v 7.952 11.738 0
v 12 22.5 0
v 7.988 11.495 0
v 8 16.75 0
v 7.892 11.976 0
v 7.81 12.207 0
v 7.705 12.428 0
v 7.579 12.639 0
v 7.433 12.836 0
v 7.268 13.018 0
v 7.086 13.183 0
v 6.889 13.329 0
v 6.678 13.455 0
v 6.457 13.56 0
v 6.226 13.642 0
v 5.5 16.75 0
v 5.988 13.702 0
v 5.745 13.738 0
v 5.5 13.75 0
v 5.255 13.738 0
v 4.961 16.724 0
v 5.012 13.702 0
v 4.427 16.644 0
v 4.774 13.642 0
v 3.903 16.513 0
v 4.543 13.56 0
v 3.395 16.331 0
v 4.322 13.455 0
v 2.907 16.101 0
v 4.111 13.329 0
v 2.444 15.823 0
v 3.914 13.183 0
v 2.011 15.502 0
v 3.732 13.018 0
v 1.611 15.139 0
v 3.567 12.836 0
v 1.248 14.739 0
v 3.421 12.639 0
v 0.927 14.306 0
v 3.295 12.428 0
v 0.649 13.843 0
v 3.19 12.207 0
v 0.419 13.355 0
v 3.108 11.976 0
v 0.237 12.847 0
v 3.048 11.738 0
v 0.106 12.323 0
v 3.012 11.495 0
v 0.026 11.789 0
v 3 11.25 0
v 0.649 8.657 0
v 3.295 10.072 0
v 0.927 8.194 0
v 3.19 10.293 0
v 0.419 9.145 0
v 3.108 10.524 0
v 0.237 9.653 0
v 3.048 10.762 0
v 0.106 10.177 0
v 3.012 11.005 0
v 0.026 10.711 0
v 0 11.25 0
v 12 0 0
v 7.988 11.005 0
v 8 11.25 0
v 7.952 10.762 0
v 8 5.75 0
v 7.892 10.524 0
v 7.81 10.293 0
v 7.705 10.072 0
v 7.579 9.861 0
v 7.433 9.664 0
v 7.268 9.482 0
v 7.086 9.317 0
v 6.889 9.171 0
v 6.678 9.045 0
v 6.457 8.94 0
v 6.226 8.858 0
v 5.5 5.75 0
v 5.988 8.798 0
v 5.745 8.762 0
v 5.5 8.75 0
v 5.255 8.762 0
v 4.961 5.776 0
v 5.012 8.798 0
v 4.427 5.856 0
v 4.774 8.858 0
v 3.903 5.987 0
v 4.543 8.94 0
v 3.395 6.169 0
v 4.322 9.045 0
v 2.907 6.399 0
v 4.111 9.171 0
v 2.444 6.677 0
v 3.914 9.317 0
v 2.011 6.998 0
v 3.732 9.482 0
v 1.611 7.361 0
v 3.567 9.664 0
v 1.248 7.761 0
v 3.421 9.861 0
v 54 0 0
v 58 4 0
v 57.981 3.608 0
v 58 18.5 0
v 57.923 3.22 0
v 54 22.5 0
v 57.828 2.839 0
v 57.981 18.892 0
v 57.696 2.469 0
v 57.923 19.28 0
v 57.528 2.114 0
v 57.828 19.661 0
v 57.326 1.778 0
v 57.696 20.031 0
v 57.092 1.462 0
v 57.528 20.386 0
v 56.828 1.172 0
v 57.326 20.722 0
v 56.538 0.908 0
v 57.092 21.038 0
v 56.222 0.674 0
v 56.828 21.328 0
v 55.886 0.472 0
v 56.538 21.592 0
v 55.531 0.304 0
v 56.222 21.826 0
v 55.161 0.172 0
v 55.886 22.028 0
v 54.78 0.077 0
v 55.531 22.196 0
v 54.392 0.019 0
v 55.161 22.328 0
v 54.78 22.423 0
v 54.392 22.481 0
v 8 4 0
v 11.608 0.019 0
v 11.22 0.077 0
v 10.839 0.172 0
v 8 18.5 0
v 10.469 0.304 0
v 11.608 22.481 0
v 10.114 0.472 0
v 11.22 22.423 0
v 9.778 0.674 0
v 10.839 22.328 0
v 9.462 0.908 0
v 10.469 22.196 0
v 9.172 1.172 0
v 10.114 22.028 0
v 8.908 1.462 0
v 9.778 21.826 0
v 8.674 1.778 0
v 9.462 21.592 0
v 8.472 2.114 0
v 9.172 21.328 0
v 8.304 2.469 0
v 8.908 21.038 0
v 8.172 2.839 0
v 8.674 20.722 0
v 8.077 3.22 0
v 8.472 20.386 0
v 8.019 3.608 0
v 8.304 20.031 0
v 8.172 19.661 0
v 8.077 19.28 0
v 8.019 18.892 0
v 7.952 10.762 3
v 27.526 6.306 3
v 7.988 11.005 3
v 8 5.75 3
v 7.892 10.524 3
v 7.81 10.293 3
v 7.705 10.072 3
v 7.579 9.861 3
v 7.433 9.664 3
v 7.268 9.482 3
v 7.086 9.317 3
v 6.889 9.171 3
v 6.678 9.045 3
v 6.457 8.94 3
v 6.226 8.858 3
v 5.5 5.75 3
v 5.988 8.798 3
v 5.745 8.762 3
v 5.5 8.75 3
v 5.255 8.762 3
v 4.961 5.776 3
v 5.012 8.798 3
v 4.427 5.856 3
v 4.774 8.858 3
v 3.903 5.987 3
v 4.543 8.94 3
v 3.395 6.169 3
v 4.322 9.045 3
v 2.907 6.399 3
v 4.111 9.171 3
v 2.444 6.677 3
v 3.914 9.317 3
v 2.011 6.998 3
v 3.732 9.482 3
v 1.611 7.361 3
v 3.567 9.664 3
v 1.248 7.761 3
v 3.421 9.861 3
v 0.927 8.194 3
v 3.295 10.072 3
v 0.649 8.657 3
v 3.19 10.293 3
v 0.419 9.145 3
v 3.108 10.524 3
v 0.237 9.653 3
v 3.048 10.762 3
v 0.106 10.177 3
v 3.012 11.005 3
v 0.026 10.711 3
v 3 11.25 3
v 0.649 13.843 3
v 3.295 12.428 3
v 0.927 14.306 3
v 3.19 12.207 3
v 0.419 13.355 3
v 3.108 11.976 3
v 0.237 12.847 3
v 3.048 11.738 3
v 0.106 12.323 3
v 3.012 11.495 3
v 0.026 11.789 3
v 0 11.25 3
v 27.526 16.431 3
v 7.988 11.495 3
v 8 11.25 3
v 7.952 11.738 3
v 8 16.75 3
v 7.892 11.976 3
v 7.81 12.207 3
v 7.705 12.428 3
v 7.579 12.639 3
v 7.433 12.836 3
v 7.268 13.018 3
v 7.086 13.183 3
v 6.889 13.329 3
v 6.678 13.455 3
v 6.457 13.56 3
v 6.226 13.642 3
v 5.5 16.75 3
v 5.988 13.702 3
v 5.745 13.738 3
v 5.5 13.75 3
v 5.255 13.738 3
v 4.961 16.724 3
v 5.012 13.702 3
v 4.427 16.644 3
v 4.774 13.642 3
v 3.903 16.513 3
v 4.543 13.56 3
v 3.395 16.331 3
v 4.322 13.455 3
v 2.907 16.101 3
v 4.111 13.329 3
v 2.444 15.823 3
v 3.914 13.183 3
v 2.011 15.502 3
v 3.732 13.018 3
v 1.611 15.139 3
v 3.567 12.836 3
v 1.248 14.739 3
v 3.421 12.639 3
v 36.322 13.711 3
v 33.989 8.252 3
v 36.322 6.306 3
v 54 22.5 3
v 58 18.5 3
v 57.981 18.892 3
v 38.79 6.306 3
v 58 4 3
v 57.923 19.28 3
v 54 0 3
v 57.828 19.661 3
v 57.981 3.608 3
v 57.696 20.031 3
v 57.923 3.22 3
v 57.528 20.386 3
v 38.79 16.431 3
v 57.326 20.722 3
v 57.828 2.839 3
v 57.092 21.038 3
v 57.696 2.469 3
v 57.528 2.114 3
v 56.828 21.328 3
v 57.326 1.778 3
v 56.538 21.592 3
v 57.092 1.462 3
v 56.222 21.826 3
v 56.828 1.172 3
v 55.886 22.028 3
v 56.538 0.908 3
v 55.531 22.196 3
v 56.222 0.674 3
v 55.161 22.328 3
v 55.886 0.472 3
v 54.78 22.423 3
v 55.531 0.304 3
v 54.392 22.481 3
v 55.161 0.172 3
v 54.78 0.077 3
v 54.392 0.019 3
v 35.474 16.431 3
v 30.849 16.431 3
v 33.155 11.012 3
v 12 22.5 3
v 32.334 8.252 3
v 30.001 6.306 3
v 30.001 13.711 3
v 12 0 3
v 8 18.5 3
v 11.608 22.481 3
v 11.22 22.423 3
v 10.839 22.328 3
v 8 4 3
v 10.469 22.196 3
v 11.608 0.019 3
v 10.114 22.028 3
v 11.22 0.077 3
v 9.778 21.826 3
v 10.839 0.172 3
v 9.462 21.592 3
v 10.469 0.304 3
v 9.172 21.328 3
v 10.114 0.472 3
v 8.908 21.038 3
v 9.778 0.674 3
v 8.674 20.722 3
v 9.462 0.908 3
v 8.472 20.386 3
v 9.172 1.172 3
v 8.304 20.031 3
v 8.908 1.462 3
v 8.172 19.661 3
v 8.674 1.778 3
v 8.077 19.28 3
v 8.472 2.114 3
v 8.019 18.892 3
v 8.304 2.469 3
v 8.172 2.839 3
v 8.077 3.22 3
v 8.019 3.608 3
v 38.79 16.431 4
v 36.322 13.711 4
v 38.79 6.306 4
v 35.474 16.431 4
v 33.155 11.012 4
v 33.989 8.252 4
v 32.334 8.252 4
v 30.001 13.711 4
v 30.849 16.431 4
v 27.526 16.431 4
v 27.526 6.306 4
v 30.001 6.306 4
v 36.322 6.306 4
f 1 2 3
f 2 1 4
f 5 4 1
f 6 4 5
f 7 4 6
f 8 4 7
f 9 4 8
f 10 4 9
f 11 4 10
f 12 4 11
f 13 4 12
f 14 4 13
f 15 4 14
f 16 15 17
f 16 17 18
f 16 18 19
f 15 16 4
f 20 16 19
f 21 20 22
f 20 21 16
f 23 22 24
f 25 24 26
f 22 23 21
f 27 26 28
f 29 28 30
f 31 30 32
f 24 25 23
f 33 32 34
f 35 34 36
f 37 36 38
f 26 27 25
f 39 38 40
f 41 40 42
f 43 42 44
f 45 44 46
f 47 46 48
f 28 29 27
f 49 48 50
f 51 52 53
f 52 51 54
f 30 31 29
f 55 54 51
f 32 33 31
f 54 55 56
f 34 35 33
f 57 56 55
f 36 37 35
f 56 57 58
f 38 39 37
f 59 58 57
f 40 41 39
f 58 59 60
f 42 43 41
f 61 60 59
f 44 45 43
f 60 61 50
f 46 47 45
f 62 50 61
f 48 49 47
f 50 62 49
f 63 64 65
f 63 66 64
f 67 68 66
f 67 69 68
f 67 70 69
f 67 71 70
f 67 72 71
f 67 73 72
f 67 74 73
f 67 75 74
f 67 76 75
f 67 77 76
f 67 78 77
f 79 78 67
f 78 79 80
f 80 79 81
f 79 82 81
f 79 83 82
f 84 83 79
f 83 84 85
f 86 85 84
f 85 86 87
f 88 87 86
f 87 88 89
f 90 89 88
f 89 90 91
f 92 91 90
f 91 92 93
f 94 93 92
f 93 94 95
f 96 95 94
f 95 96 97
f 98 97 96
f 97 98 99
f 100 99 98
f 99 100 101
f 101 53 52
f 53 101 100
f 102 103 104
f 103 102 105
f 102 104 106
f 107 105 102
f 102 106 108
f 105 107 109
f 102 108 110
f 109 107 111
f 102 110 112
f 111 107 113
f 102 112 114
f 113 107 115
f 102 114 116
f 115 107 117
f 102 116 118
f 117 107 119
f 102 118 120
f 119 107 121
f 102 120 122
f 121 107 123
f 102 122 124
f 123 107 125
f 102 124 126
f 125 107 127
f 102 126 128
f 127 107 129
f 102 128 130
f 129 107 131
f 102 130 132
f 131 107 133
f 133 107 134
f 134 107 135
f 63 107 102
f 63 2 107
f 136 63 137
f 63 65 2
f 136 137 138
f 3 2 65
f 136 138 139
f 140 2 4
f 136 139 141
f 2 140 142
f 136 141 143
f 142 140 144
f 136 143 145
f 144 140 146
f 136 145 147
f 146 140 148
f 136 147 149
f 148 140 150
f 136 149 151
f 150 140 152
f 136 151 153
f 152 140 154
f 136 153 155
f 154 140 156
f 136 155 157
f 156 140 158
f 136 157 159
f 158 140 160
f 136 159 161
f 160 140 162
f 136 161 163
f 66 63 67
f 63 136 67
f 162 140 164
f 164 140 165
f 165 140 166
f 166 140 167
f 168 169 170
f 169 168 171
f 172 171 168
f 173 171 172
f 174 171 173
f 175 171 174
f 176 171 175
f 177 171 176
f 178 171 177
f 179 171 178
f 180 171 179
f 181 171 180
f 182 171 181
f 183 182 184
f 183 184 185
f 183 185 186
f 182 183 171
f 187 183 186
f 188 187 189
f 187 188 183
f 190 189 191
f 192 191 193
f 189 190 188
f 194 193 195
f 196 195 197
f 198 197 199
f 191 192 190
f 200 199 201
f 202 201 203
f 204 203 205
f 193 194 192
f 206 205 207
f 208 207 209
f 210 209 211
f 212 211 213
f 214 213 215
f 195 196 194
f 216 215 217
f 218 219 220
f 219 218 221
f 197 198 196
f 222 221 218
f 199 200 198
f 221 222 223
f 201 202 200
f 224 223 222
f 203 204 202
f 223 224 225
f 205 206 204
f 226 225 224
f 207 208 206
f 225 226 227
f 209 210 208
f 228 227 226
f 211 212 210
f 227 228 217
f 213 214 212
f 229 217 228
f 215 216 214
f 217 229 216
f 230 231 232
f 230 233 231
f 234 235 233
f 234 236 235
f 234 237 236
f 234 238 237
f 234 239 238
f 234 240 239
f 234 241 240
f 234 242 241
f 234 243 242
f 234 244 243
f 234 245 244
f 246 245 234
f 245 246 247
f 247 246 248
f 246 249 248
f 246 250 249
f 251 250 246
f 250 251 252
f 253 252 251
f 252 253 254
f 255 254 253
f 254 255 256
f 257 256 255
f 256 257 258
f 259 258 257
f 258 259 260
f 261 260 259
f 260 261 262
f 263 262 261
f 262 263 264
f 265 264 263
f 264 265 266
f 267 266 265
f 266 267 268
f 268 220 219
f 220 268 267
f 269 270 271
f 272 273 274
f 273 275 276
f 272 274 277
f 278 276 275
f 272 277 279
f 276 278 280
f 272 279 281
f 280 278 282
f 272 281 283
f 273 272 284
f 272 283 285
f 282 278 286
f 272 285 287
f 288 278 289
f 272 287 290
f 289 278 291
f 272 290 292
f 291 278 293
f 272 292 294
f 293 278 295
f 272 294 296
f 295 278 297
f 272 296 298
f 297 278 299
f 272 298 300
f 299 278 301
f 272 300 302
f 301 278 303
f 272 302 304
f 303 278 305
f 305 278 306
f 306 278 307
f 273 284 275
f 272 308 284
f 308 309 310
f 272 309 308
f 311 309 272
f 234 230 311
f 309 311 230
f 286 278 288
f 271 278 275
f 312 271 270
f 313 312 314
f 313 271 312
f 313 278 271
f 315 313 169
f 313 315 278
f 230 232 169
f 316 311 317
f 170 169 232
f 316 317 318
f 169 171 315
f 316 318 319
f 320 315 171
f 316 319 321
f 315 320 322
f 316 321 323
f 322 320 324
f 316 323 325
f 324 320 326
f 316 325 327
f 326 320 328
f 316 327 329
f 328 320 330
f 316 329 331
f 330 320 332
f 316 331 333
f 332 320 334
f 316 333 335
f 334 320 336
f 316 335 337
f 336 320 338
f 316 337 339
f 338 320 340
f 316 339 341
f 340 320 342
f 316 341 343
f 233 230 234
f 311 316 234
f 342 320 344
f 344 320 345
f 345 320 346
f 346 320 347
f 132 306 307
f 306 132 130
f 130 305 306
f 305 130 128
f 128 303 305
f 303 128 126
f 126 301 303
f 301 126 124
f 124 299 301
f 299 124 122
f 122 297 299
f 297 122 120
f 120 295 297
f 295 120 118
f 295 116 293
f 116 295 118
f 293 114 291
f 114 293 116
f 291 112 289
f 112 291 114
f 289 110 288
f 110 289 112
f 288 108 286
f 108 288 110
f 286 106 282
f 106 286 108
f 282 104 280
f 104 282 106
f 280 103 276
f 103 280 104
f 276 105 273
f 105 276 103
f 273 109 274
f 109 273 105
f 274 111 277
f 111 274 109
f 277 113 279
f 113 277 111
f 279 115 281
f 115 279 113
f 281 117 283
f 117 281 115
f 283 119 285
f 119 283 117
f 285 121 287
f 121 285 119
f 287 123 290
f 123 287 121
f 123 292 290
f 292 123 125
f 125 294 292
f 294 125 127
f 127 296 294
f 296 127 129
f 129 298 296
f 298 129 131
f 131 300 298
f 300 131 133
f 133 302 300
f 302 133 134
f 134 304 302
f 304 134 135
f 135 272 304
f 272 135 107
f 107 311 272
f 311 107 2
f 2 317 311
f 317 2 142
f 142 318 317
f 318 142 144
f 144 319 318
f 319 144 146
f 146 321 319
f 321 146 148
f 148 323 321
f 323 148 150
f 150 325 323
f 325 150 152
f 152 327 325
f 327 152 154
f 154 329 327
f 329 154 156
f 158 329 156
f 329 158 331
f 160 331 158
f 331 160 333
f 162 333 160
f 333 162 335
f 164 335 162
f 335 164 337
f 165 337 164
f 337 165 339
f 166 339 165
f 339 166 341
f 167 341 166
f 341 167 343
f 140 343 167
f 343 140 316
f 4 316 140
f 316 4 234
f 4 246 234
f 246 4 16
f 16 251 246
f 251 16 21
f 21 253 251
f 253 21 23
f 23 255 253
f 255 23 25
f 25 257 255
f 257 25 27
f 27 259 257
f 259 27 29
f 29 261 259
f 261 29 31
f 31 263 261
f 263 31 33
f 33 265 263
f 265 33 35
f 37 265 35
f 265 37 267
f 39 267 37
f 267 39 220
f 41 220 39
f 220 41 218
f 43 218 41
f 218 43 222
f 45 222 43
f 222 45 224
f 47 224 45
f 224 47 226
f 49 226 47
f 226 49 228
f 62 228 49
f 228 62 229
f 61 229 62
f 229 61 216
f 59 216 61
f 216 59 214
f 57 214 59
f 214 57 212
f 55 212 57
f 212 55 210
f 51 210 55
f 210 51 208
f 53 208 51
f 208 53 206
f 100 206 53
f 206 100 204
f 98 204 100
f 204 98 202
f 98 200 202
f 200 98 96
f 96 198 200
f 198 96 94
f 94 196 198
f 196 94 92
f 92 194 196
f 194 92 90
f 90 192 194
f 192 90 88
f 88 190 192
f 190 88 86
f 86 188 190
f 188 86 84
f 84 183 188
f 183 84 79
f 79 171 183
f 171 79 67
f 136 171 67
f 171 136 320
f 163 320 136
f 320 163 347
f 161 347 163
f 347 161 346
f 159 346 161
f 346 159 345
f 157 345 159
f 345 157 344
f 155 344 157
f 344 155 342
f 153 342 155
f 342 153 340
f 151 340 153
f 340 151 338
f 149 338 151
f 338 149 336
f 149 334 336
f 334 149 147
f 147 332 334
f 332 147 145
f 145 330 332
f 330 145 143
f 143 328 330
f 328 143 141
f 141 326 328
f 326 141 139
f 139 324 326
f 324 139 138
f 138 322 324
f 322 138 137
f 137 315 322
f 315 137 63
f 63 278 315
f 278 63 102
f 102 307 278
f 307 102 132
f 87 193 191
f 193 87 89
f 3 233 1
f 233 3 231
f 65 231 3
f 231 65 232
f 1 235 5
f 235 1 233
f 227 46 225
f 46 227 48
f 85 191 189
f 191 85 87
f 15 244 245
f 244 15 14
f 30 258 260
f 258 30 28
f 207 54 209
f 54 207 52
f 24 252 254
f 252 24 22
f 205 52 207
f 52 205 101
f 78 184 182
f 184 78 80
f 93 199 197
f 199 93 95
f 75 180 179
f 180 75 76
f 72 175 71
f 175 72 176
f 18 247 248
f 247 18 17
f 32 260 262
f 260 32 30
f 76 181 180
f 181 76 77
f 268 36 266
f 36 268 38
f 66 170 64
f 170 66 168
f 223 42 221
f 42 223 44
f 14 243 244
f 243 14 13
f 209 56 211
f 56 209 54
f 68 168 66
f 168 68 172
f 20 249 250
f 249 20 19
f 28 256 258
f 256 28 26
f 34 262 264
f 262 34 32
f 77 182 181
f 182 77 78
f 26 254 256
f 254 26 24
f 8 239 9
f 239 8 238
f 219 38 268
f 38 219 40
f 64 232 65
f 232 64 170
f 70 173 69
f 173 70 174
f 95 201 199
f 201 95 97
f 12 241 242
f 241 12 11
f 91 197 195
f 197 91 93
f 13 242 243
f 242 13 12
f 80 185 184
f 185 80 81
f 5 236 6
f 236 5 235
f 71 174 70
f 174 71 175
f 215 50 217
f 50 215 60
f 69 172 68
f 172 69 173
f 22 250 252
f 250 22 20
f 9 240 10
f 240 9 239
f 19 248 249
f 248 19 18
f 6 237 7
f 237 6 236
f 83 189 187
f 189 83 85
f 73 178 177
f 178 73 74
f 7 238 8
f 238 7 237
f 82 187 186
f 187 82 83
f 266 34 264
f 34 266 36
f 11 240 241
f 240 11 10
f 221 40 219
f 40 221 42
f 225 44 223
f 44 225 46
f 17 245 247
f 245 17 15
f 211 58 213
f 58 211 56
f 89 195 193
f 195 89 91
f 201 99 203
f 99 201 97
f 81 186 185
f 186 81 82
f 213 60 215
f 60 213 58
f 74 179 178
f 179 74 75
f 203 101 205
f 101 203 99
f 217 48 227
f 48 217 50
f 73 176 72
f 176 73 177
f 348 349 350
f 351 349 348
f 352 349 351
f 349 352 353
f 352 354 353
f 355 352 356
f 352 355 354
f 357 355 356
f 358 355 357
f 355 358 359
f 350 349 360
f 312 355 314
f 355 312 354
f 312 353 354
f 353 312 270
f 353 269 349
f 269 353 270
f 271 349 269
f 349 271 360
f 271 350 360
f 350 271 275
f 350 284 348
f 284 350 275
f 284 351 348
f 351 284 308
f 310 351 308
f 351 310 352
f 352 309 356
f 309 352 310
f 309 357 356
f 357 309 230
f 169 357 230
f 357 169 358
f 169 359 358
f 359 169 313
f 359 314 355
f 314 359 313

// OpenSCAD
// Portachiavi: forma (rettangolo, cerchio, cuore) con testo in rilievo e anello per la chiave.
testo = "M";
forma = "rettangolo";
larghezza = 50;
spessore = 3;
dimensione_testo = 10;
rilievo = 1;

FONT = "DejaVu Sans:style=Bold";
$fn = 64;
foro = 5;
altezza = forma == "rettangolo" ? larghezza * 0.45
        : forma == "cuore" ? larghezza / (2 * 0.3536 + 1) * 1.5607
        : larghezza;

module sagoma() {
    if (forma == "cerchio") {
        translate([larghezza / 2, larghezza / 2]) circle(d = larghezza);
    } else if (forma == "cuore") {
        // Quadrato ruotato di 45° con due cerchi sui lati superiori; larghezza totale = larghezza.
        s = larghezza / (2 * 0.3536 + 1);
        translate([larghezza / 2, 0])
            union() {
                rotate(45) square(s);
                translate([-0.3536 * s, 1.0607 * s]) circle(d = s);
                translate([ 0.3536 * s, 1.0607 * s]) circle(d = s);
            }
    } else {
        r = 4;
        hull() for (x = [r, larghezza - r], y = [r, altezza - r]) translate([x, y]) circle(r = r);
    }
}

// Linguetta con il foro a sinistra.
module linguetta() {
    hull() {
        translate([0, altezza / 2]) circle(d = foro + 6);
        translate([foro + 6, altezza / 2 - (foro + 6) / 2]) square([1, foro + 6]);
    }
}

difference() {
    linear_extrude(spessore) union() {
        translate([foro + 3, 0]) sagoma();
        translate([foro / 2 + 3, 0]) linguetta();
    }
    translate([foro / 2 + 3, altezza / 2, -1]) cylinder(d = foro, h = spessore + 2);
}

if (len(testo) > 0)
    translate([foro + 3 + larghezza / 2, forma == "cuore" ? altezza * 0.6 : altezza / 2, spessore - 0.01])
        linear_extrude(rilievo + 0.01)
            text(testo, size = dimensione_testo, font = FONT, halign = "center", valign = "center");
